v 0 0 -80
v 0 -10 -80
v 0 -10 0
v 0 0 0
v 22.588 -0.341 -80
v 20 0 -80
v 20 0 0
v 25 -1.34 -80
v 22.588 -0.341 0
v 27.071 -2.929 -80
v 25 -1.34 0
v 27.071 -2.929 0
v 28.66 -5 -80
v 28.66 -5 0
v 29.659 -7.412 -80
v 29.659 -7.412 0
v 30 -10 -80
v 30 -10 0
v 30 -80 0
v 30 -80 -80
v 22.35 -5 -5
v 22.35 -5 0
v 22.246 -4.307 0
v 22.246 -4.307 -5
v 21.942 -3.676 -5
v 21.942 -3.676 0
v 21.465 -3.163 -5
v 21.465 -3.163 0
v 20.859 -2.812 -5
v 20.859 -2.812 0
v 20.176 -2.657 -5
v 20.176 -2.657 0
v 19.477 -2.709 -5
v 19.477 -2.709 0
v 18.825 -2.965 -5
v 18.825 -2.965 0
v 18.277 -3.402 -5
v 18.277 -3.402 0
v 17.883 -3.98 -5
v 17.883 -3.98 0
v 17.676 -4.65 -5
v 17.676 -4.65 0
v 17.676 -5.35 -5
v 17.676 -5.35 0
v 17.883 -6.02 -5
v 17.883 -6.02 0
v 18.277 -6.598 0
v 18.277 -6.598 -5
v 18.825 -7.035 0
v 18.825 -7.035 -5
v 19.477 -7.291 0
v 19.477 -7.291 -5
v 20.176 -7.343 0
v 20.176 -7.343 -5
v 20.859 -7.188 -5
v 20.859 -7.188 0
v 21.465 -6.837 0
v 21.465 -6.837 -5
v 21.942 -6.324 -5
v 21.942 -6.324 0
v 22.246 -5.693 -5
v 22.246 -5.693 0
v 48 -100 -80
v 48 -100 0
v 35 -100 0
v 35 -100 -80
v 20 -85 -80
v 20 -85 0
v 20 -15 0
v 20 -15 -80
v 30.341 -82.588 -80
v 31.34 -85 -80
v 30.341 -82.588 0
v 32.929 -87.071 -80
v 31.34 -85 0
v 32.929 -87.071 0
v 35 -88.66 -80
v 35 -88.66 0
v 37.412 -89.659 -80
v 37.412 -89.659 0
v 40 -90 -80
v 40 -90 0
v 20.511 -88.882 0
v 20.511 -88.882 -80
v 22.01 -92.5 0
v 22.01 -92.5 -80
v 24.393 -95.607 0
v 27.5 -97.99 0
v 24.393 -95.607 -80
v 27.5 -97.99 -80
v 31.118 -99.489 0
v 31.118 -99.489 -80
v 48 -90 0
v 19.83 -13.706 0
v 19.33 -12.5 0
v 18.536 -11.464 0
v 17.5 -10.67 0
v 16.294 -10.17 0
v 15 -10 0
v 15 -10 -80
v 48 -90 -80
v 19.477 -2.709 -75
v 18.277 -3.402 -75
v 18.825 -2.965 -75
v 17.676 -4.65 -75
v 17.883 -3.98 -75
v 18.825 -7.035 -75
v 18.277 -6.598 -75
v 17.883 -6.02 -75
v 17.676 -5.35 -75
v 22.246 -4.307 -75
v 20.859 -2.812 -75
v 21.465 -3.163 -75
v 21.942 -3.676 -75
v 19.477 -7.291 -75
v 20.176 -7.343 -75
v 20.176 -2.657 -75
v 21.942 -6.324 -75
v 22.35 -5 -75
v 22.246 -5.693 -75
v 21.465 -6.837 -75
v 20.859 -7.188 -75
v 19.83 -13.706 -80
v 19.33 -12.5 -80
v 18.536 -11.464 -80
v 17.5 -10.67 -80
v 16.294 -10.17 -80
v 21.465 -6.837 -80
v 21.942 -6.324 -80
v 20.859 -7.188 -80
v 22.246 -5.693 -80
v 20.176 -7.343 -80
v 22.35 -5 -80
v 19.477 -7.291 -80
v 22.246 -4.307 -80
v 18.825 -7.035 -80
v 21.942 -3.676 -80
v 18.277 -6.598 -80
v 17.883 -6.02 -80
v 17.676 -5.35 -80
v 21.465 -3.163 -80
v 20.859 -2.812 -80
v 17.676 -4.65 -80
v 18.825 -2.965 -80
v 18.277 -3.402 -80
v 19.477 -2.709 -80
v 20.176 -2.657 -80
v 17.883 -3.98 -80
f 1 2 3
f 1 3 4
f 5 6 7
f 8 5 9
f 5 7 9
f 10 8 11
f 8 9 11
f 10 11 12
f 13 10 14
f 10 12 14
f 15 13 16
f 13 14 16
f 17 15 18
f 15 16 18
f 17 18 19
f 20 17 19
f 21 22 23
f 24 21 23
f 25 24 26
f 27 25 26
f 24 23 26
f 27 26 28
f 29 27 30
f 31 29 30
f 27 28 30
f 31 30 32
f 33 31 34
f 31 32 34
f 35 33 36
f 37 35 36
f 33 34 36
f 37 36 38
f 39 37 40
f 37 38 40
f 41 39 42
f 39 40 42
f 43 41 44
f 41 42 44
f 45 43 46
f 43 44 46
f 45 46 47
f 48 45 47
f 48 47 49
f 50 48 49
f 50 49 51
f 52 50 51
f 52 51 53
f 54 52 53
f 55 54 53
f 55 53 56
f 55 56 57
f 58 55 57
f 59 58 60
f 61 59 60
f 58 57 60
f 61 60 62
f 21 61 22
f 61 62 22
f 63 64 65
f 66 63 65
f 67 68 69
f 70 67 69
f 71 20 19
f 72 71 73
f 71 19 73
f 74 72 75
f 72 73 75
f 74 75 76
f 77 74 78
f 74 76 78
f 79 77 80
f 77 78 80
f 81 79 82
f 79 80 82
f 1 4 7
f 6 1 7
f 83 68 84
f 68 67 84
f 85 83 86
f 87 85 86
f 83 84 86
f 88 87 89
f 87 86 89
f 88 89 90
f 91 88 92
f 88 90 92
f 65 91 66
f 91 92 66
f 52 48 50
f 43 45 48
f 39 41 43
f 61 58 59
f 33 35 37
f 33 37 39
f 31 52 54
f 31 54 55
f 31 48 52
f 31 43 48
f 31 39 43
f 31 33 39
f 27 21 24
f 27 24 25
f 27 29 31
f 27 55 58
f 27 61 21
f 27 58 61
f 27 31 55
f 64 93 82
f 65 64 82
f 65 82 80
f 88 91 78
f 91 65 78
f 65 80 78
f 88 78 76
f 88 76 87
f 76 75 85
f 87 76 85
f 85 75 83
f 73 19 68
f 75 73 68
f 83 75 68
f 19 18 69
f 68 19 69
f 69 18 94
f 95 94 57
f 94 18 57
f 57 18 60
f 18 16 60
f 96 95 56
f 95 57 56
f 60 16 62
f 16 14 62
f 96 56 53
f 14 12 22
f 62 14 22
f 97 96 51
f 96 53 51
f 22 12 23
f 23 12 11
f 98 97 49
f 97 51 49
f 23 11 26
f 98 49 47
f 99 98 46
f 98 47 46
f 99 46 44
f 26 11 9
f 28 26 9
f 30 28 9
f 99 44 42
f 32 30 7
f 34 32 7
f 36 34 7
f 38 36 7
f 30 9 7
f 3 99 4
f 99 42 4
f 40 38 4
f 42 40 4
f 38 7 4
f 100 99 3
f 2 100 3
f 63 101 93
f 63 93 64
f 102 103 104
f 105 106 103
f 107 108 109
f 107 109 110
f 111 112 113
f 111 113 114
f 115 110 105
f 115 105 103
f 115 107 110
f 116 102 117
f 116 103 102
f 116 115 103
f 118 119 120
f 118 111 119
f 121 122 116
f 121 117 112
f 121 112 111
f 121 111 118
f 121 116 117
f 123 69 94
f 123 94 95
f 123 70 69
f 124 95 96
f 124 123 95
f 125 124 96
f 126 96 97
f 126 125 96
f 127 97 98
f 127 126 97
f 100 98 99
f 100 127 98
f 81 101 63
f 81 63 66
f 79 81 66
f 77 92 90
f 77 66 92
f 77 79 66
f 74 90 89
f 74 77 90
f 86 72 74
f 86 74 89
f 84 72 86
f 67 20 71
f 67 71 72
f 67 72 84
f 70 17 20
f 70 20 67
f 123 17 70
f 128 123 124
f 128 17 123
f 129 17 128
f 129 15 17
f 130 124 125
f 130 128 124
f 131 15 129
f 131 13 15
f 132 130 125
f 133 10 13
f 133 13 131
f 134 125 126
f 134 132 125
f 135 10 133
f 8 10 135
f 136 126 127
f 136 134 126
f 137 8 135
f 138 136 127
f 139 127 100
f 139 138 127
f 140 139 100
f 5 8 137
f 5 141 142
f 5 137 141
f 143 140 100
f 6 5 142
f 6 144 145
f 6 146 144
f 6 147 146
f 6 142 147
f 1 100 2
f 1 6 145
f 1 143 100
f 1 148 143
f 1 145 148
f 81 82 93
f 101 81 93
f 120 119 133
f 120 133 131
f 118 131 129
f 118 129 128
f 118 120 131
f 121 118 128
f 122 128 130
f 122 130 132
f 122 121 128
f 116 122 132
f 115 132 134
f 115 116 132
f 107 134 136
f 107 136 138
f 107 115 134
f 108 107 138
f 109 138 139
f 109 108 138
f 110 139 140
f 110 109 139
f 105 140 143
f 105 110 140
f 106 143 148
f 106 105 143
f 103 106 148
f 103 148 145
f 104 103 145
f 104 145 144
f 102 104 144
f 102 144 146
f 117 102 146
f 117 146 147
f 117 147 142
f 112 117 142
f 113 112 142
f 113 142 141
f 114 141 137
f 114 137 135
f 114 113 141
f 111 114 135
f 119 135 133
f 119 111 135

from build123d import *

# Parameters (mm, degrees)
SALIENTE_EXTRUIR3_DEPTH = 80
CROQUIS2_R              = 2.35
CORTAR_EXTRUIR1_DEPTH   = 5
CORTAR_EXTRUIR2_START   = -5
CROQUIS3_R              = 2.35
CORTAR_EXTRUIR2_DEPTH   = 5
REDONDEO1_R             = 15
REDONDEO3_R             = 5


with BuildPart() as part:
    # Croquis1 → Saliente-Extruir3 (new body)
    with BuildSketch(Plane.XY):
        with BuildLine():
            Line((0, 0), (20, 0))
            ThreePointArc((20, 0), (27.071067812, -2.928932188), (30, -10))
            Line((30, -10), (30, -80))
            ThreePointArc((30, -80), (32.928932188, -87.071067812), (40, -90))
            Line((40, -90), (48, -90))
            Line((48, -90), (48, -100))
            Line((48, -100), (20, -100))
            Line((20, -100), (20, -10))
            Line((20, -10), (0, -10))
            Line((0, -10), (0, 0))
        make_face()
    extrude(amount=-SALIENTE_EXTRUIR3_DEPTH)

    # Croquis2 → Cortar-Extruir1 (cut)
    with BuildSketch(Plane.XY):
        with Locations((20, -5)):
            Circle(CROQUIS2_R)
    extrude(amount=-CORTAR_EXTRUIR1_DEPTH, mode=Mode.SUBTRACT)

    # Croquis3 → Cortar-Extruir2 (cut)
    with BuildSketch(Plane(origin=(0, 0, -80), x_dir=(-1, 0, 0), z_dir=(0, 0, -1)).offset(CORTAR_EXTRUIR2_START)):
        with Locations(Location((-20, -5, 0), (0, 0, 180))):
            Circle(CROQUIS3_R)
    extrude(amount=CORTAR_EXTRUIR2_DEPTH, mode=Mode.SUBTRACT)

    # Redondeo1
    redondeo1_edges = [part.edges().sort_by_distance(p)[0] for p in [
        (20, -100, -40),
    ]]
    fillet(redondeo1_edges, radius=REDONDEO1_R)

    # Redondeo3
    redondeo3_edges = [part.edges().sort_by_distance(p)[0] for p in [
        (20, -10, -40),
    ]]
    fillet(redondeo3_edges, radius=REDONDEO3_R)


solid = part.part
